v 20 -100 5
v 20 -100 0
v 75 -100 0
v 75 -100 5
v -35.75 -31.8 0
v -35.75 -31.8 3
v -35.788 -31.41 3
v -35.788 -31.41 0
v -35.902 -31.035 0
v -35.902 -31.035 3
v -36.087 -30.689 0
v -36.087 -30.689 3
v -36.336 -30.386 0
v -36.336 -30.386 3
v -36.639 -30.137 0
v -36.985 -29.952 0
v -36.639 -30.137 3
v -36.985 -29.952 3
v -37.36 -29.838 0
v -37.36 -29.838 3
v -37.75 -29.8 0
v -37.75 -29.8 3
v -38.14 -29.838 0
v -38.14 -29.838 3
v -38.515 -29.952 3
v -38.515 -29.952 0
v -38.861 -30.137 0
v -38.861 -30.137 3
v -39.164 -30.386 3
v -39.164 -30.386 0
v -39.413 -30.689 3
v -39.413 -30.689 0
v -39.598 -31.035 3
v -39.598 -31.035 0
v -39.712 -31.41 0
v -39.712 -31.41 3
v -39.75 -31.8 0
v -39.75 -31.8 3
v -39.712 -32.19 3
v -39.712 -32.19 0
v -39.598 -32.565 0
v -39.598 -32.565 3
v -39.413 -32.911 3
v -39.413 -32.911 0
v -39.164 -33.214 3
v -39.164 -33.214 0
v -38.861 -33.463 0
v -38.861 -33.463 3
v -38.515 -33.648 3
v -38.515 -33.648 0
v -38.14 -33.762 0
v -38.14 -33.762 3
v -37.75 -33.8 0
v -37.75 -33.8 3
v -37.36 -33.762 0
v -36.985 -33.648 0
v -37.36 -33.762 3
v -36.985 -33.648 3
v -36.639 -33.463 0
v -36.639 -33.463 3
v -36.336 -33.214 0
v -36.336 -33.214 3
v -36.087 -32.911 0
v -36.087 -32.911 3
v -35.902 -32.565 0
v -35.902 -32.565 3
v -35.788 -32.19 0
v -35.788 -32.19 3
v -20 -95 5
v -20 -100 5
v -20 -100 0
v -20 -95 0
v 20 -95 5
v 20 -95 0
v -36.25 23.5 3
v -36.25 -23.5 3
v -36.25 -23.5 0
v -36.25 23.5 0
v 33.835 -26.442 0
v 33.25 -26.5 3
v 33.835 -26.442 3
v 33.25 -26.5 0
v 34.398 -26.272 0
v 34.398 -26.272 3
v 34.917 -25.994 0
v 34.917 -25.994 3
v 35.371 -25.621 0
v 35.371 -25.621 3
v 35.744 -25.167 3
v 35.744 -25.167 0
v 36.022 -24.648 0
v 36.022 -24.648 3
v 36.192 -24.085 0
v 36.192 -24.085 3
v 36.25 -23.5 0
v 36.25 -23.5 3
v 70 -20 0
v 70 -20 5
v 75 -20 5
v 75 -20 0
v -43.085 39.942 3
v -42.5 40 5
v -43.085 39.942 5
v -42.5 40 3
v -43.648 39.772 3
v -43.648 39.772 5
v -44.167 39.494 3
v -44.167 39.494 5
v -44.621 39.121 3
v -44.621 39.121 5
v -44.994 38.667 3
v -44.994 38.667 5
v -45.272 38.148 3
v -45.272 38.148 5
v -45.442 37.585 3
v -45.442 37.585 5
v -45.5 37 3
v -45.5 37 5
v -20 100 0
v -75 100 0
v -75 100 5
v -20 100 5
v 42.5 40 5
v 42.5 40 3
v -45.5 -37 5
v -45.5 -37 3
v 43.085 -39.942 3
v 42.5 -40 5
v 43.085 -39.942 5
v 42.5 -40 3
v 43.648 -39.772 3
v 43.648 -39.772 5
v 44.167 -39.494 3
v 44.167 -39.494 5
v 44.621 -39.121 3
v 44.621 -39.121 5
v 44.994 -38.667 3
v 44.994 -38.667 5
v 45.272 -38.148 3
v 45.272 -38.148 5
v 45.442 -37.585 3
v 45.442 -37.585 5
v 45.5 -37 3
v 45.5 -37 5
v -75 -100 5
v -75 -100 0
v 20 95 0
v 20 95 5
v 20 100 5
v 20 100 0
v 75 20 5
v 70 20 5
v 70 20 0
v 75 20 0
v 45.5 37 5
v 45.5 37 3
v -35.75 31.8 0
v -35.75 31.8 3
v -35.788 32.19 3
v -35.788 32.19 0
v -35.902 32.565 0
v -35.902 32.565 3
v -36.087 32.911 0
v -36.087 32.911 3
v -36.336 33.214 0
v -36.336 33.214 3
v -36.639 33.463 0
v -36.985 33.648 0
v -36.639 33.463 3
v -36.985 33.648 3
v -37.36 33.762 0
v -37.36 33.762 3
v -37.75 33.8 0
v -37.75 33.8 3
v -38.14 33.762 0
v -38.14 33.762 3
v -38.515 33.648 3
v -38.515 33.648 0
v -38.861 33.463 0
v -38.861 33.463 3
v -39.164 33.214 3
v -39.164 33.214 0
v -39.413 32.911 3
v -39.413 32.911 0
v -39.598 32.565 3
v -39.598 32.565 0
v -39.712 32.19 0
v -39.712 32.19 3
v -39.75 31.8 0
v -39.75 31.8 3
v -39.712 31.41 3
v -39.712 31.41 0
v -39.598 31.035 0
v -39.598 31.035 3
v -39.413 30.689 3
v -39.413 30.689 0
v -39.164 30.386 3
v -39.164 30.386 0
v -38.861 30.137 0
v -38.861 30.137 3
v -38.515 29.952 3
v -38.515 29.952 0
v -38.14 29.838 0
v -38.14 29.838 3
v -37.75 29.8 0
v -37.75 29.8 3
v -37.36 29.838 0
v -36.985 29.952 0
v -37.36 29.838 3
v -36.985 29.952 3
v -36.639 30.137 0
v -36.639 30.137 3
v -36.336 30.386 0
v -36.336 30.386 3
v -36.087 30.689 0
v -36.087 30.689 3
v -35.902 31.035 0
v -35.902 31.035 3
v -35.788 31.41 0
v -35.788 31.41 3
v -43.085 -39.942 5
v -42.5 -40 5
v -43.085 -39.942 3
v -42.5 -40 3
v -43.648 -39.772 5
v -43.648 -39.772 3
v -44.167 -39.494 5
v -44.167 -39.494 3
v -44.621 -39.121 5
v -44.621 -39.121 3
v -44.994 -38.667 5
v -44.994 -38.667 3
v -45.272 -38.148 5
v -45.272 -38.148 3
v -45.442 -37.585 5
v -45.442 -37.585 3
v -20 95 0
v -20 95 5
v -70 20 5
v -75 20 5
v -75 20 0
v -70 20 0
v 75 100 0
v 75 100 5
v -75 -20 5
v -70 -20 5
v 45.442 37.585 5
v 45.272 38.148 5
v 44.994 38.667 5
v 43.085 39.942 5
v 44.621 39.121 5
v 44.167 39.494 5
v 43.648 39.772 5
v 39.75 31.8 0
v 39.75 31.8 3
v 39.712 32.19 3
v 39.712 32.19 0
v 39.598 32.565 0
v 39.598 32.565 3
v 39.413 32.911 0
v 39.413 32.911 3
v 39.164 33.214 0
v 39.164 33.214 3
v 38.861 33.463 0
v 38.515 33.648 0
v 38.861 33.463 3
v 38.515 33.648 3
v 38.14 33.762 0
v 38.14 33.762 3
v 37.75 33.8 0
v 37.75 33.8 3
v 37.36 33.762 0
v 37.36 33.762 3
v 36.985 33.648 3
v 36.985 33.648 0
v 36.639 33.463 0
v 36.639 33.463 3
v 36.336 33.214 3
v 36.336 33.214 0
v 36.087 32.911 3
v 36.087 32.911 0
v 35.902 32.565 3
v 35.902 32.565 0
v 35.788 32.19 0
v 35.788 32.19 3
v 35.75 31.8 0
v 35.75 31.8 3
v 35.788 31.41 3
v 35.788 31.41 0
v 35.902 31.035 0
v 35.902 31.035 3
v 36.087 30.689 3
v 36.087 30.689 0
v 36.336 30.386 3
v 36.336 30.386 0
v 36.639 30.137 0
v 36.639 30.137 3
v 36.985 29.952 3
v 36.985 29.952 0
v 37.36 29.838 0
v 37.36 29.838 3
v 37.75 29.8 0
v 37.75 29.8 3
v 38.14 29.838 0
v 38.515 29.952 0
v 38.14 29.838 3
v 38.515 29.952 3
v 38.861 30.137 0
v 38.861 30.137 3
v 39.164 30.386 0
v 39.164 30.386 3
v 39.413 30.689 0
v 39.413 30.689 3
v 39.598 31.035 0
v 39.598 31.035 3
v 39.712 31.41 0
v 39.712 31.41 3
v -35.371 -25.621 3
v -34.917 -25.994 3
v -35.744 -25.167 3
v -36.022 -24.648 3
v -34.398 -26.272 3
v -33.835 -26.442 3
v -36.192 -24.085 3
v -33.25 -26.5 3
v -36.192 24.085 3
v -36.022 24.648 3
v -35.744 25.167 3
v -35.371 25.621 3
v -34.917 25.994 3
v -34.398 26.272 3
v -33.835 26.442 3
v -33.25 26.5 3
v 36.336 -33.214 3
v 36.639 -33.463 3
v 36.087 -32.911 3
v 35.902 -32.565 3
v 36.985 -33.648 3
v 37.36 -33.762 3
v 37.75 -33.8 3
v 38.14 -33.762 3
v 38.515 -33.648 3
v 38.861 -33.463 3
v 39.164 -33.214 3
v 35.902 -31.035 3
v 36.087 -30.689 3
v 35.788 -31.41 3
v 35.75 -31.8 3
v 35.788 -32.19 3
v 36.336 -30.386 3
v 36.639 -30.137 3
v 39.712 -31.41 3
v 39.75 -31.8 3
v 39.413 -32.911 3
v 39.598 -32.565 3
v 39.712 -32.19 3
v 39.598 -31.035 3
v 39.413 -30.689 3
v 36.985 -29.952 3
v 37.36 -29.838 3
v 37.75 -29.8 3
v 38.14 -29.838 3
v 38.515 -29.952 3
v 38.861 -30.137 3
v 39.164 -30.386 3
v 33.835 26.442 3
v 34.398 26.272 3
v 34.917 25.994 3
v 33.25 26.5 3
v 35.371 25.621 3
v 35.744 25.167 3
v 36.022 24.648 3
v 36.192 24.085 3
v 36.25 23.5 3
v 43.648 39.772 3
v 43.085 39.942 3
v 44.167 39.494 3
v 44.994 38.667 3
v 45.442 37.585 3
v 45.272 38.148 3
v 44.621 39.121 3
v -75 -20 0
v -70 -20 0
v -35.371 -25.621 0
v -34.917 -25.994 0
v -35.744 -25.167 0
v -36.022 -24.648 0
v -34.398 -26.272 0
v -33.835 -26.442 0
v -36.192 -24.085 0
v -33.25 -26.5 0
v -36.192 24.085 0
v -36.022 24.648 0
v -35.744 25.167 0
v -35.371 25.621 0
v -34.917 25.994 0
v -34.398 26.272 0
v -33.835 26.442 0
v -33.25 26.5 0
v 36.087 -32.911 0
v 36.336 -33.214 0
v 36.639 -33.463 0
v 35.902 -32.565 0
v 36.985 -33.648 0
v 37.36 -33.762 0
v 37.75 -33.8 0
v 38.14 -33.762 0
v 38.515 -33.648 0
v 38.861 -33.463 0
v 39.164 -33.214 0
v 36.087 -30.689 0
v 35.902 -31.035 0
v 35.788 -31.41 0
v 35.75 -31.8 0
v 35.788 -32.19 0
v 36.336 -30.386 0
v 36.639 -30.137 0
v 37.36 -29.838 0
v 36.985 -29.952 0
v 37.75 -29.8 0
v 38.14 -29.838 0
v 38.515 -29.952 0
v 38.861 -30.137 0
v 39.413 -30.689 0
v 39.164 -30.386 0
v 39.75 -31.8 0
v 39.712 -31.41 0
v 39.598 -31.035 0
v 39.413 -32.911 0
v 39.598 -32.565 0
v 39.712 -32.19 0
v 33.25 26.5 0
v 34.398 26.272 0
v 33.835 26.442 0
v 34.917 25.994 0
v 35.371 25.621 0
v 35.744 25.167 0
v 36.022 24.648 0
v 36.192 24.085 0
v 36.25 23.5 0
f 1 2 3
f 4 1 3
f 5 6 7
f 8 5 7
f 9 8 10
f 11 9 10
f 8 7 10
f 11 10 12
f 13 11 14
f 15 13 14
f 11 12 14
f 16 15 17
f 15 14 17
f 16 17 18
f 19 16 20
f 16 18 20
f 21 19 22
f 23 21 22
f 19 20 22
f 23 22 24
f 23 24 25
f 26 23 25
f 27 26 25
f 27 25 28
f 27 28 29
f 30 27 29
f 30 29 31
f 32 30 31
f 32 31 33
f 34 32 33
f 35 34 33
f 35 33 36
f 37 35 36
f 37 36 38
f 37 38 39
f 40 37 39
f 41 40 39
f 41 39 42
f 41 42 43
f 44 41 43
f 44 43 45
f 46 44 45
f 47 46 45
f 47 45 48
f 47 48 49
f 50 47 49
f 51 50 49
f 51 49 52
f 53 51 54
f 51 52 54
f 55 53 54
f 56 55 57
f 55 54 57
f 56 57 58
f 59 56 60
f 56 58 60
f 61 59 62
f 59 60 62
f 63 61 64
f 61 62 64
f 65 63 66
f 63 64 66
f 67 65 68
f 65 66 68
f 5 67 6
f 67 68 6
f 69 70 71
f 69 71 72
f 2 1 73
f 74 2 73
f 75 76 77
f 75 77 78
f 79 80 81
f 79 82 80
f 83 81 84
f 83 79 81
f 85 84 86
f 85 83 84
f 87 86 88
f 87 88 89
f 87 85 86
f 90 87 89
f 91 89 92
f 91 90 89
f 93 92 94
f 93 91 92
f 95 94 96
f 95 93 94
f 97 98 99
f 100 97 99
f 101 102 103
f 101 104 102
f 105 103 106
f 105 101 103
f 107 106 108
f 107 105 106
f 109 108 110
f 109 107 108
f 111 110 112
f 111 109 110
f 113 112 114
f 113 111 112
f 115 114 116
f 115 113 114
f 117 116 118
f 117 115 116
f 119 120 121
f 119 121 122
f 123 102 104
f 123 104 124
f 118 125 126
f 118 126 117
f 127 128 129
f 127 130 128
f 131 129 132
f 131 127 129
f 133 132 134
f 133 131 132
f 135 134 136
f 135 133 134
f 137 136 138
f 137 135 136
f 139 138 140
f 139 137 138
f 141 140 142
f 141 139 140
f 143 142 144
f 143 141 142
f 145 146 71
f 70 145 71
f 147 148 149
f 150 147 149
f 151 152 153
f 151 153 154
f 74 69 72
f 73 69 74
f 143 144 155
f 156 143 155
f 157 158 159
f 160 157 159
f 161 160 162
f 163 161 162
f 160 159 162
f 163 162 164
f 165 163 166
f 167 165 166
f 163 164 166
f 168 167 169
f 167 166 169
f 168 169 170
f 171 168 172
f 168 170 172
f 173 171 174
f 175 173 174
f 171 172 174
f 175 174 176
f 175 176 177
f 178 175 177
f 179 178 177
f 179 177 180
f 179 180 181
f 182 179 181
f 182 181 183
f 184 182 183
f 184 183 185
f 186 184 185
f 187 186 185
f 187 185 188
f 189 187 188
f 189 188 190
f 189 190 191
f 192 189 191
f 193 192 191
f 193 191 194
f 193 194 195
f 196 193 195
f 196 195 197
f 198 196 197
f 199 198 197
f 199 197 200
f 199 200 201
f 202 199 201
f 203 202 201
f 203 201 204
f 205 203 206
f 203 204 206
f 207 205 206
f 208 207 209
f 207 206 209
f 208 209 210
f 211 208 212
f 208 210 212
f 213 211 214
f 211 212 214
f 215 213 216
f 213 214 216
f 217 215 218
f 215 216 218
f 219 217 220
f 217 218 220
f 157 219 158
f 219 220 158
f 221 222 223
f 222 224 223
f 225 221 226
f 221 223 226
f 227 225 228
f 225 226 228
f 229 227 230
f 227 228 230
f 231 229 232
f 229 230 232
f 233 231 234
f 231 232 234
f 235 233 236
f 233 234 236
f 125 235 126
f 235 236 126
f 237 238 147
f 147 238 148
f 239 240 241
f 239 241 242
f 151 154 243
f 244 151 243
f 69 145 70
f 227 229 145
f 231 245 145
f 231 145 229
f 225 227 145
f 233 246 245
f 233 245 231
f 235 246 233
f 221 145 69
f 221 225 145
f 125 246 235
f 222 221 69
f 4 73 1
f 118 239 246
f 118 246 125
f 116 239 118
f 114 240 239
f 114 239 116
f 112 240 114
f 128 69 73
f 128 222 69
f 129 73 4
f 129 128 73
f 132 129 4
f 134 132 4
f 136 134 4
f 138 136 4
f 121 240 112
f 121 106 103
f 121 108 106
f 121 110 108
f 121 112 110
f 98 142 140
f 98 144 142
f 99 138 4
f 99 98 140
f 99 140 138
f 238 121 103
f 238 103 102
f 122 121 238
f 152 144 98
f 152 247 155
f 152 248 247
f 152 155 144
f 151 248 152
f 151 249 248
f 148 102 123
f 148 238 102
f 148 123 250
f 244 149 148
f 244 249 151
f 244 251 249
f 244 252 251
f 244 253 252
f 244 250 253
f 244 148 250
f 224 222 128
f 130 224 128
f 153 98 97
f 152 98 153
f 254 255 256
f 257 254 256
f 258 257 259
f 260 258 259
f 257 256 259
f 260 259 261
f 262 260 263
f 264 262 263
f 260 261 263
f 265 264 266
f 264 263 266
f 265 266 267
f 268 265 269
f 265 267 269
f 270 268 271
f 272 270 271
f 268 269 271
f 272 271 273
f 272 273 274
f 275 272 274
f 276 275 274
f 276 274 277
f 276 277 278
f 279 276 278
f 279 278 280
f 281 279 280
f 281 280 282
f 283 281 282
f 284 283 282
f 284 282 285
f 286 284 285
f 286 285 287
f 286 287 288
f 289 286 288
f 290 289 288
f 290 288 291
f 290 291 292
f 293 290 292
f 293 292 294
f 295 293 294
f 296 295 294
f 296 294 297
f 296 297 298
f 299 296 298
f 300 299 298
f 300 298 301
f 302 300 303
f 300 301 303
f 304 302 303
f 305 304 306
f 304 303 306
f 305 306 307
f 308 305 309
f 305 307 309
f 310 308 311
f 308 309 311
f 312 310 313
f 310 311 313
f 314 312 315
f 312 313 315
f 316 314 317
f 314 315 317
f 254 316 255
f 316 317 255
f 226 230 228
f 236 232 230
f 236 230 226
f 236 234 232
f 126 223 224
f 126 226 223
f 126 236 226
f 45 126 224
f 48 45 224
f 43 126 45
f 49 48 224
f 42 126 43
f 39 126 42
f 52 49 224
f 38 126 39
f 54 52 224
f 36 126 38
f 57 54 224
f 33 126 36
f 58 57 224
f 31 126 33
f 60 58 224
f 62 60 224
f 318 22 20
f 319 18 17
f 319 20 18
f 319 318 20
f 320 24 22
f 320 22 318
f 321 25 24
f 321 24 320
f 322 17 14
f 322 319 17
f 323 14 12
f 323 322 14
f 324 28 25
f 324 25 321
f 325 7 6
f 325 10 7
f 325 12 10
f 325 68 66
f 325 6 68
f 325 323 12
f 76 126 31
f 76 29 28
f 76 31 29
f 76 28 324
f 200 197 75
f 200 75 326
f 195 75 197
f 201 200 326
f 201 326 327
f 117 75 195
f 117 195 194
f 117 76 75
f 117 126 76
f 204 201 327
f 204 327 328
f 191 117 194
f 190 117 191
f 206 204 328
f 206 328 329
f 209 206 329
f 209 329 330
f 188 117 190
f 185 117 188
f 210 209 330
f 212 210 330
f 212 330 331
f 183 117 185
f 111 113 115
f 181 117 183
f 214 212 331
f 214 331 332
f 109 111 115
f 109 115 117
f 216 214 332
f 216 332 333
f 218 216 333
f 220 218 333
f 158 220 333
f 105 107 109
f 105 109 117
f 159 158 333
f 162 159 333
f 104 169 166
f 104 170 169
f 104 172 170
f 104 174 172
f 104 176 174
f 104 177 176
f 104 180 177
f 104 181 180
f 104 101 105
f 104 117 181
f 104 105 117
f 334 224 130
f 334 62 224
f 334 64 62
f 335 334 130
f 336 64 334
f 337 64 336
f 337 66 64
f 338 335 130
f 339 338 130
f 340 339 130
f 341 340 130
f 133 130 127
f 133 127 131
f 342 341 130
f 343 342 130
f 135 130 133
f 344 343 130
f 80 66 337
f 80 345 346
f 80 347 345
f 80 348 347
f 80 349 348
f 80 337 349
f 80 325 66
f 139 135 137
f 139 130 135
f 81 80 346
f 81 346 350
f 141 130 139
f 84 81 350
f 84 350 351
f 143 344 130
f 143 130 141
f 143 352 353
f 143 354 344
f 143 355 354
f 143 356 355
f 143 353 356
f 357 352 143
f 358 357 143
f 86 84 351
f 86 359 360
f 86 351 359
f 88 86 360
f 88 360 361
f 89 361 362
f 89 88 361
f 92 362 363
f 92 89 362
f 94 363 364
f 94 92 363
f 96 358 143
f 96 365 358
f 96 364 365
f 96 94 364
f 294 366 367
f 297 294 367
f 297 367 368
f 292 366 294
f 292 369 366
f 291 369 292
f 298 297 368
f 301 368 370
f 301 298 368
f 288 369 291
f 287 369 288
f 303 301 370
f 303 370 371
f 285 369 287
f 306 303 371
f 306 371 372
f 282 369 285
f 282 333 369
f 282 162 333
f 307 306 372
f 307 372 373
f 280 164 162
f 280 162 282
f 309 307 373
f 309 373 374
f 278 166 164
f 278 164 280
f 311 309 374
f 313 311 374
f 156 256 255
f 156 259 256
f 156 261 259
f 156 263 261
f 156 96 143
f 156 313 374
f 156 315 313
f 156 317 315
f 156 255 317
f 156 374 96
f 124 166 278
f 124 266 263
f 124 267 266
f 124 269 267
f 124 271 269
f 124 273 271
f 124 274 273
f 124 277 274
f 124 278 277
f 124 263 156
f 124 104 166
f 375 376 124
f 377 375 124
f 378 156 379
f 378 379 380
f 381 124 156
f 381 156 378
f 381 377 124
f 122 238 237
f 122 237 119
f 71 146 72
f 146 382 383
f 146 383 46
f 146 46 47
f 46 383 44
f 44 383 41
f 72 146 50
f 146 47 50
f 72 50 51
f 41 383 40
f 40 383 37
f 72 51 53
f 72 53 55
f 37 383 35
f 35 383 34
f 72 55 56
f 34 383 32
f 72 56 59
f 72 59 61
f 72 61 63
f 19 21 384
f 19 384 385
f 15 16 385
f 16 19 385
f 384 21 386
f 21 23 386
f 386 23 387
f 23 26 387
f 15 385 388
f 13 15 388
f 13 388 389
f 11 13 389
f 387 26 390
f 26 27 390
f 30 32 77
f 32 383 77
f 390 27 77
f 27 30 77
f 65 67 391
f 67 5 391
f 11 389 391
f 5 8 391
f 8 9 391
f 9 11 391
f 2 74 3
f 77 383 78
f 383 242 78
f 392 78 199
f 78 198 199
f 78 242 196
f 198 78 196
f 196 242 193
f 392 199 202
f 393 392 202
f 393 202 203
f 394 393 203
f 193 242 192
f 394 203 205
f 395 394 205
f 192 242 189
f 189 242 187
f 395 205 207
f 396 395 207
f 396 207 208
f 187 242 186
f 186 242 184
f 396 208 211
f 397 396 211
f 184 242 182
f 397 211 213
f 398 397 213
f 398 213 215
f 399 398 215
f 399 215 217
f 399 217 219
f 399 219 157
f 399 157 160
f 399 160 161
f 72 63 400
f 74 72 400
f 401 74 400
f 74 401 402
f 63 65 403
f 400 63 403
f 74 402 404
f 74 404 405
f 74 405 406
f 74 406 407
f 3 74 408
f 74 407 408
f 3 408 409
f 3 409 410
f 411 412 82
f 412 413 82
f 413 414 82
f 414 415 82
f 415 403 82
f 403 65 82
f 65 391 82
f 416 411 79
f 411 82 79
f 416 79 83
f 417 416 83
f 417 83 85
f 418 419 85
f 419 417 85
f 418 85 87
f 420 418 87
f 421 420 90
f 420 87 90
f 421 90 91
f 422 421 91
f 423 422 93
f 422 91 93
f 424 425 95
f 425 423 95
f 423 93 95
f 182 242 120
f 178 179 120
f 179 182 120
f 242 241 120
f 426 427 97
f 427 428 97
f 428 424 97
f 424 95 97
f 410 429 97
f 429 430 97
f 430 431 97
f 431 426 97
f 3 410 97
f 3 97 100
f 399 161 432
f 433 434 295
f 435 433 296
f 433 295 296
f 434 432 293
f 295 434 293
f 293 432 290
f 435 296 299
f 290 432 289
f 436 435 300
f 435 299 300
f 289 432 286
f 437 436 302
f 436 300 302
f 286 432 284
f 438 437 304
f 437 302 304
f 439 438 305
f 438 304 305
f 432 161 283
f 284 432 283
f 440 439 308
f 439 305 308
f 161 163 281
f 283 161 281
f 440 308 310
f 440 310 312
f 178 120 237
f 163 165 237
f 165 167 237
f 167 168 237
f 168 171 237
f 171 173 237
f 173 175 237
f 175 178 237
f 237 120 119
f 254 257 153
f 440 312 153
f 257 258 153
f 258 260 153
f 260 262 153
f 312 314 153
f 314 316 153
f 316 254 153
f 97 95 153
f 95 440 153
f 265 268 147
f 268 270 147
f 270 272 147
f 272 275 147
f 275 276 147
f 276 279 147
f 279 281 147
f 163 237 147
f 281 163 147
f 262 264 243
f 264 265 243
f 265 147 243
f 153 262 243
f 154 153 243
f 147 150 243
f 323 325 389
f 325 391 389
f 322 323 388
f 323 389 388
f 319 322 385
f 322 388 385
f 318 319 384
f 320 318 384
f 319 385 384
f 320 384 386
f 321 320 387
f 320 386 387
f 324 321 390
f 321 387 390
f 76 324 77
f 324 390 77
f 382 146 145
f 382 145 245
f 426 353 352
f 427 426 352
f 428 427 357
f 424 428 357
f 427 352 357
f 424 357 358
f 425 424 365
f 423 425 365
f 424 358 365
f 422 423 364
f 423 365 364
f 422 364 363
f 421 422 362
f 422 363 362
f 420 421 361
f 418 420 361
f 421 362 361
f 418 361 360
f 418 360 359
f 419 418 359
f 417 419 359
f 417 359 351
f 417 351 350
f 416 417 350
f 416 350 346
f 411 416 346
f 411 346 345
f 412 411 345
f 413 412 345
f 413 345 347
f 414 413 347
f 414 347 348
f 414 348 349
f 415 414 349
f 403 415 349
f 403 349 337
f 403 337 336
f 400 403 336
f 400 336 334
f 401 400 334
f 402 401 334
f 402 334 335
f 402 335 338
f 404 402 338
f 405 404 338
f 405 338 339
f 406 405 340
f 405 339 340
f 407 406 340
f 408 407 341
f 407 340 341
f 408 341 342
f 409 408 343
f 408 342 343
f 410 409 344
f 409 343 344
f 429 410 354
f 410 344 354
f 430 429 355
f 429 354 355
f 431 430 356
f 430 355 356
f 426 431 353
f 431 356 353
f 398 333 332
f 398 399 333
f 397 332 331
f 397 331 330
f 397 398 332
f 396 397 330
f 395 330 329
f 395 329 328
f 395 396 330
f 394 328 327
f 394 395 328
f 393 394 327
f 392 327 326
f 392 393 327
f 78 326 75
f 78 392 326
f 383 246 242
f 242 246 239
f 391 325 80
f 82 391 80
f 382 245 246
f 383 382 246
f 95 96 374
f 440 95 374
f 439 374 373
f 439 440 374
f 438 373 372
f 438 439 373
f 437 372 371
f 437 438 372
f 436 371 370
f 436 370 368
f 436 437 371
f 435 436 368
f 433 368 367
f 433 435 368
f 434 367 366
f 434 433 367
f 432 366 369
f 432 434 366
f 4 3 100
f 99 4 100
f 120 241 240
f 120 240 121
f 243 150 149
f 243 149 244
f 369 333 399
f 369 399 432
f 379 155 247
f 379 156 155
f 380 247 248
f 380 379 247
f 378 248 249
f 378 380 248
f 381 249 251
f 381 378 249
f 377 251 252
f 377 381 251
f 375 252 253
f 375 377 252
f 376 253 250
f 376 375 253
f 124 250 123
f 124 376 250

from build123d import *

# Parameters (mm, degrees)
CROQUIS1_W              = 150
CROQUIS1_H              = 200
SALIENTE_EXTRUIR1_DEPTH = 5
CROQUIS3_R              = 2
CROQUIS3_W              = 40
CROQUIS3_H              = 5
CROQUIS3_W_2            = 5
CROQUIS3_H_2            = 40
CROQUIS3_W_3            = 72.5
CROQUIS3_H_3            = 53
CORTAR_EXTRUIR2_DEPTH   = 5
CROQUIS4_W              = 91
CROQUIS4_H              = 80
CORTAR_EXTRUIR3_DEPTH   = 2
REDONDEO1_R             = 3


with BuildPart() as part:
    # Croquis1 → Saliente-Extruir1 (new body)
    with BuildSketch(Plane.XY):
        Rectangle(CROQUIS1_W, CROQUIS1_H)
    extrude(amount=SALIENTE_EXTRUIR1_DEPTH)

    # Croquis3 → Cortar-Extruir2 (cut)
    with BuildSketch(Plane.XY.offset(5)):
        with Locations((-37.75, 31.8)):
            Circle(CROQUIS3_R)
        with Locations((37.75, 31.8)):
            Circle(CROQUIS3_R)
        with Locations((37.75, -31.8)):
            Circle(CROQUIS3_R)
        with Locations((-37.75, -31.8)):
            Circle(CROQUIS3_R)
        with Locations((0, 97.5)):
            Rectangle(CROQUIS3_W, CROQUIS3_H)
        with Locations((0, -97.5)):
            Rectangle(CROQUIS3_W, CROQUIS3_H)
        with Locations((-72.5, 0)):
            Rectangle(CROQUIS3_W_2, CROQUIS3_H_2)
        with Locations((72.5, 0)):
            Rectangle(CROQUIS3_W_2, CROQUIS3_H_2)
        Rectangle(CROQUIS3_W_3, CROQUIS3_H_3)
    extrude(amount=-CORTAR_EXTRUIR2_DEPTH, mode=Mode.SUBTRACT)

    # Croquis4 → Cortar-Extruir3 (cut)
    with BuildSketch(Plane.XY.offset(5)):
        Rectangle(CROQUIS4_W, CROQUIS4_H)
    extrude(amount=-CORTAR_EXTRUIR3_DEPTH, mode=Mode.SUBTRACT)

    # Redondeo1
    redondeo1_edges = [part.edges().sort_by_distance(p)[0] for p in [
        (-45.5, -40, 4),
        (-45.5, 40, 4),
        (45.5, 40, 4),
        (45.5, -40, 4),
        (36.25, 26.5, 1.5),
        (36.25, -26.5, 1.5),
        (-36.25, -26.5, 1.5),
        (-36.25, 26.5, 1.5),
    ]]
    fillet(redondeo1_edges, radius=REDONDEO1_R)


solid = part.part
